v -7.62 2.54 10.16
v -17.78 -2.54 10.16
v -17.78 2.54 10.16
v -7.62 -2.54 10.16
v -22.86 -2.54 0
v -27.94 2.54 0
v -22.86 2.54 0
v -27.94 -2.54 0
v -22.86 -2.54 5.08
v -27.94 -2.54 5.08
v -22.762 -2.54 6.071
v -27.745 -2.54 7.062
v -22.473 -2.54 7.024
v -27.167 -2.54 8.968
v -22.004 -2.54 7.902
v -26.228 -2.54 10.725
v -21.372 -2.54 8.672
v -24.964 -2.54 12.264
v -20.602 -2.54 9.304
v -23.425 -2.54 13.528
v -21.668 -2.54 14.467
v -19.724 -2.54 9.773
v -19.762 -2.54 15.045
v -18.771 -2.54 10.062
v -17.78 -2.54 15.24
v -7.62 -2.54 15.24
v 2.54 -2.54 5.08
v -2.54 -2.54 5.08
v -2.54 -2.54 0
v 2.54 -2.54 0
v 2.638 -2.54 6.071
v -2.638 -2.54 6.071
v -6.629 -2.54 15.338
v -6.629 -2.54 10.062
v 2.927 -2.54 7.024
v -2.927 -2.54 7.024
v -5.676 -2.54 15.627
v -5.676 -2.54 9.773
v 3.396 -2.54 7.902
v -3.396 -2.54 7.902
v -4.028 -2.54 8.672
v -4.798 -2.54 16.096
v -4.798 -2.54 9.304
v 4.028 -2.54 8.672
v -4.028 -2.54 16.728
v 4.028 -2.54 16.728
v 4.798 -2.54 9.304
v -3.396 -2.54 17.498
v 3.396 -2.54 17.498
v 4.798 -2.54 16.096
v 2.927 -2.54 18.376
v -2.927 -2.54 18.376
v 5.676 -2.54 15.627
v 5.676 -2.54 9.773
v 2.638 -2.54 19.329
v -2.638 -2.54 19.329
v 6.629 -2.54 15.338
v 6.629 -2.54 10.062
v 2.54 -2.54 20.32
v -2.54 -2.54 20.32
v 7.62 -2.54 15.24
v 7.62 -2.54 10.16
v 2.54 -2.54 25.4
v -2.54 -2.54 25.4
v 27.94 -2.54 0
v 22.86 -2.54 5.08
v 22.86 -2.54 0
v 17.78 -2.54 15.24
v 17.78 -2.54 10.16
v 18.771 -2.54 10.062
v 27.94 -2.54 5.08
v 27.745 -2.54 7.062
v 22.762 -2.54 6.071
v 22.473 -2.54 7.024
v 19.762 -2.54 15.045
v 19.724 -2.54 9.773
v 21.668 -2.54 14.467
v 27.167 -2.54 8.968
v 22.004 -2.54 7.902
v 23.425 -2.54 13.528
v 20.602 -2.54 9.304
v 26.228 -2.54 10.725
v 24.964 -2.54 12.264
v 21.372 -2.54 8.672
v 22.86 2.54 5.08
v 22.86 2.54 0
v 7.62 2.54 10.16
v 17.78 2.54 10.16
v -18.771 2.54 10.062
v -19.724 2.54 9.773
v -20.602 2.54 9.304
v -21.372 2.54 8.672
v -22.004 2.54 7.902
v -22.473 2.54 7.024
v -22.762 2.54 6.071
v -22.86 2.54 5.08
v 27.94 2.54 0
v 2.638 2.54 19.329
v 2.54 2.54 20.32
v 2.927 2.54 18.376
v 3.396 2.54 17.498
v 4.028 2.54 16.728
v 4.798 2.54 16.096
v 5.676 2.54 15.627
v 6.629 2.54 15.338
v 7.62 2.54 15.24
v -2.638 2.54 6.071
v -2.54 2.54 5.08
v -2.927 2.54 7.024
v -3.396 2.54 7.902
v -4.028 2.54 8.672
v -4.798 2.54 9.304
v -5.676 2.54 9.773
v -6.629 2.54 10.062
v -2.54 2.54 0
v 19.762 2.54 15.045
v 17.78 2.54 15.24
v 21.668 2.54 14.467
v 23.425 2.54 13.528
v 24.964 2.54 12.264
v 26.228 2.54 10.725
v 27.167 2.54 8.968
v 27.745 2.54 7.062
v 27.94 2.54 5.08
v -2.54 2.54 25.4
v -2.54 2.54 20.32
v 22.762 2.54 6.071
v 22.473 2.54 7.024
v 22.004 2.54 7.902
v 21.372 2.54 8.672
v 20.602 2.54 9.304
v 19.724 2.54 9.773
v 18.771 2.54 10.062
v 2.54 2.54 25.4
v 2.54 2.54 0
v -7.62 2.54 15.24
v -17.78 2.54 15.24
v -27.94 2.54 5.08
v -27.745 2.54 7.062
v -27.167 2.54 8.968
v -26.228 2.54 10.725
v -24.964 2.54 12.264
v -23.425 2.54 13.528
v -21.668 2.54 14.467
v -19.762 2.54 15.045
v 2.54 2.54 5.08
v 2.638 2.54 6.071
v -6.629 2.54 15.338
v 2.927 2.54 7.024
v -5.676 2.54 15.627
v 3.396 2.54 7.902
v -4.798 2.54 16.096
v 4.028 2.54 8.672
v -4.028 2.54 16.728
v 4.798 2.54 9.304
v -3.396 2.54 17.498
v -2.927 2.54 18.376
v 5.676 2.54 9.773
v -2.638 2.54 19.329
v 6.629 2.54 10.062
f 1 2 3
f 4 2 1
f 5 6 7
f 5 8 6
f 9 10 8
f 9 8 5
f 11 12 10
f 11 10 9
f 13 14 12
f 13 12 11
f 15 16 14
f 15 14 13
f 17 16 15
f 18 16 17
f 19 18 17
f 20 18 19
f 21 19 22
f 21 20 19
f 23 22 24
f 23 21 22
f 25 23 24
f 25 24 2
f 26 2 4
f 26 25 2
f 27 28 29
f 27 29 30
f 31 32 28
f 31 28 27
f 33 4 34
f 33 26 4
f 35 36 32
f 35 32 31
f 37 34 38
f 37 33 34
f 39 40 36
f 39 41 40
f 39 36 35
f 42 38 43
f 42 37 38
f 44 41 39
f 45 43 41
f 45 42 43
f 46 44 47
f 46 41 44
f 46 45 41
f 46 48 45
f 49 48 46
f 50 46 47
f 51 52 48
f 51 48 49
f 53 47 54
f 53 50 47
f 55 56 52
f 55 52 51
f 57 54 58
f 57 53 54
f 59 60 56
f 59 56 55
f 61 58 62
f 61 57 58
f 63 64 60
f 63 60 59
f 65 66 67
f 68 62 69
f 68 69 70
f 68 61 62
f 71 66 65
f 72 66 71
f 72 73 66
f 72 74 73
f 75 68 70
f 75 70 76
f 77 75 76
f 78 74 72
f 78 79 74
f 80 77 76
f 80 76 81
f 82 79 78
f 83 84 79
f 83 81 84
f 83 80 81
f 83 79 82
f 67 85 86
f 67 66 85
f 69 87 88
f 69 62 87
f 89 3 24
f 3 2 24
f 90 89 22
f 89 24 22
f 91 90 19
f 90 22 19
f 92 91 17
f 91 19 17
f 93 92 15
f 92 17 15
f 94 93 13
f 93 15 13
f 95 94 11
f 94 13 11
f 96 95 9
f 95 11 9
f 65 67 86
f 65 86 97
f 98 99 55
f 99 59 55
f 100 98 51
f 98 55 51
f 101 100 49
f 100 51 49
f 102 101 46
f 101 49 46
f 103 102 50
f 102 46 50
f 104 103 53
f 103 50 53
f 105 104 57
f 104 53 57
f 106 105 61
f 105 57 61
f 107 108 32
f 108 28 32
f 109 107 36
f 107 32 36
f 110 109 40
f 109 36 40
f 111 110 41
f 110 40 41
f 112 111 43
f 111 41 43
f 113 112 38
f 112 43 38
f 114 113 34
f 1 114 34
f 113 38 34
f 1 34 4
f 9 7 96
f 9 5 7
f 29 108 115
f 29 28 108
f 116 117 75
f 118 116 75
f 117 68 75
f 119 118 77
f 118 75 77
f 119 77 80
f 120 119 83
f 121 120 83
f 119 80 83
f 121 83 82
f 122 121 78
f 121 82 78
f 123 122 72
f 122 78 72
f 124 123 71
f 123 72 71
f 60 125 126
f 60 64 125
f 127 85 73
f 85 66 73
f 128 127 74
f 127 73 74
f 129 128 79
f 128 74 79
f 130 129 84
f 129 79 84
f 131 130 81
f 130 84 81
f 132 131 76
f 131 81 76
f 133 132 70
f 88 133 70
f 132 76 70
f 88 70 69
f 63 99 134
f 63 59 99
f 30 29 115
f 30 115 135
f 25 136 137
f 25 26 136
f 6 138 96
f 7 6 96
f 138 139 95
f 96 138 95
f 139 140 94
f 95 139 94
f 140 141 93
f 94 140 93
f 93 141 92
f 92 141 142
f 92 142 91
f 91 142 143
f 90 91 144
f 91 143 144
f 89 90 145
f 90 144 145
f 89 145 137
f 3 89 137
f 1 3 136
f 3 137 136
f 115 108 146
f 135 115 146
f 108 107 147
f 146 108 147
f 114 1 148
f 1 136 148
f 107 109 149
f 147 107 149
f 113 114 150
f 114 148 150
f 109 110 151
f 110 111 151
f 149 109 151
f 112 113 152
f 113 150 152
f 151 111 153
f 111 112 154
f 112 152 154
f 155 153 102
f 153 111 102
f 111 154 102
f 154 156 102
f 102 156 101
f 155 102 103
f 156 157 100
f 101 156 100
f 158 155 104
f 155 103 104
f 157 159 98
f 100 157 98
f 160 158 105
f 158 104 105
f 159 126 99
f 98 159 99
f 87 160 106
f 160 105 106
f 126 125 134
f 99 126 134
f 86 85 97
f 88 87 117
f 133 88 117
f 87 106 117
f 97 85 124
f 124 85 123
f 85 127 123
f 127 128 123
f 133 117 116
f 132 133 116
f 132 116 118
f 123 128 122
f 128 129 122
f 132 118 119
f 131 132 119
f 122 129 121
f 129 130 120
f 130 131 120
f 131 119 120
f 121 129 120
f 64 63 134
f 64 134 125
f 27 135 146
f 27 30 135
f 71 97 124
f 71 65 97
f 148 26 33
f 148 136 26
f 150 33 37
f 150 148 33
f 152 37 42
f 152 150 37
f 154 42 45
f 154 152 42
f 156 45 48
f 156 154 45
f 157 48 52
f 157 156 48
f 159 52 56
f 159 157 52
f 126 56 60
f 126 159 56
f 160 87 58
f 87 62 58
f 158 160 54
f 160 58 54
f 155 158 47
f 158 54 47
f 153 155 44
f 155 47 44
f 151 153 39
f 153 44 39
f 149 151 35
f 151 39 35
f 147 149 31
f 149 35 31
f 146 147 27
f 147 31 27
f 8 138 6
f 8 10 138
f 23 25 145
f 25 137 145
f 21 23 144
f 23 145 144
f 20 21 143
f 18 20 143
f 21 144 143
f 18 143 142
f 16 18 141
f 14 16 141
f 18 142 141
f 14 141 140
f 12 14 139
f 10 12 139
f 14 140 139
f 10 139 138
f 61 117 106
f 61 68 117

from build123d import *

# Parameters (mm, degrees)
F1_DEPTH = 2.54
F2_R     = 5.08
F3_R     = 10.16


with BuildPart() as f1:
    # F0 (on Front) → F1 (new body, symmetric)
    with BuildSketch(Plane.XZ):
        Polygon((-27.94, 0), (-22.86, 0), (-22.86, 10.16), (-2.54, 10.16), (-2.54, 0), (2.54, 0), (2.54, 10.16), (22.86, 10.16), (22.86, 0), (27.94, 0), (27.94, 15.24), (2.54, 15.24), (2.54, 25.4), (-2.54, 25.4), (-2.54, 15.24), (-27.94, 15.24), align=None)
    extrude(amount=F1_DEPTH, both=True)

    # F2
    f2_edges = [f1.edges().sort_by_distance(p)[0] for p in [
        (2.54, 0, 15.24),
        (2.54, 0, 10.16),
        (-2.54, 0, 10.16),
        (-2.54, 0, 15.24),
        (22.86, 0, 10.16),
        (-22.86, 0, 10.16),
    ]]
    fillet(f2_edges, radius=F2_R)

    # F3
    f3_edges = [f1.edges().sort_by_distance(p)[0] for p in [
        (27.94, 0, 15.24),
        (-27.94, 0, 15.24),
    ]]
    fillet(f3_edges, radius=F3_R)


solid = f1.part
